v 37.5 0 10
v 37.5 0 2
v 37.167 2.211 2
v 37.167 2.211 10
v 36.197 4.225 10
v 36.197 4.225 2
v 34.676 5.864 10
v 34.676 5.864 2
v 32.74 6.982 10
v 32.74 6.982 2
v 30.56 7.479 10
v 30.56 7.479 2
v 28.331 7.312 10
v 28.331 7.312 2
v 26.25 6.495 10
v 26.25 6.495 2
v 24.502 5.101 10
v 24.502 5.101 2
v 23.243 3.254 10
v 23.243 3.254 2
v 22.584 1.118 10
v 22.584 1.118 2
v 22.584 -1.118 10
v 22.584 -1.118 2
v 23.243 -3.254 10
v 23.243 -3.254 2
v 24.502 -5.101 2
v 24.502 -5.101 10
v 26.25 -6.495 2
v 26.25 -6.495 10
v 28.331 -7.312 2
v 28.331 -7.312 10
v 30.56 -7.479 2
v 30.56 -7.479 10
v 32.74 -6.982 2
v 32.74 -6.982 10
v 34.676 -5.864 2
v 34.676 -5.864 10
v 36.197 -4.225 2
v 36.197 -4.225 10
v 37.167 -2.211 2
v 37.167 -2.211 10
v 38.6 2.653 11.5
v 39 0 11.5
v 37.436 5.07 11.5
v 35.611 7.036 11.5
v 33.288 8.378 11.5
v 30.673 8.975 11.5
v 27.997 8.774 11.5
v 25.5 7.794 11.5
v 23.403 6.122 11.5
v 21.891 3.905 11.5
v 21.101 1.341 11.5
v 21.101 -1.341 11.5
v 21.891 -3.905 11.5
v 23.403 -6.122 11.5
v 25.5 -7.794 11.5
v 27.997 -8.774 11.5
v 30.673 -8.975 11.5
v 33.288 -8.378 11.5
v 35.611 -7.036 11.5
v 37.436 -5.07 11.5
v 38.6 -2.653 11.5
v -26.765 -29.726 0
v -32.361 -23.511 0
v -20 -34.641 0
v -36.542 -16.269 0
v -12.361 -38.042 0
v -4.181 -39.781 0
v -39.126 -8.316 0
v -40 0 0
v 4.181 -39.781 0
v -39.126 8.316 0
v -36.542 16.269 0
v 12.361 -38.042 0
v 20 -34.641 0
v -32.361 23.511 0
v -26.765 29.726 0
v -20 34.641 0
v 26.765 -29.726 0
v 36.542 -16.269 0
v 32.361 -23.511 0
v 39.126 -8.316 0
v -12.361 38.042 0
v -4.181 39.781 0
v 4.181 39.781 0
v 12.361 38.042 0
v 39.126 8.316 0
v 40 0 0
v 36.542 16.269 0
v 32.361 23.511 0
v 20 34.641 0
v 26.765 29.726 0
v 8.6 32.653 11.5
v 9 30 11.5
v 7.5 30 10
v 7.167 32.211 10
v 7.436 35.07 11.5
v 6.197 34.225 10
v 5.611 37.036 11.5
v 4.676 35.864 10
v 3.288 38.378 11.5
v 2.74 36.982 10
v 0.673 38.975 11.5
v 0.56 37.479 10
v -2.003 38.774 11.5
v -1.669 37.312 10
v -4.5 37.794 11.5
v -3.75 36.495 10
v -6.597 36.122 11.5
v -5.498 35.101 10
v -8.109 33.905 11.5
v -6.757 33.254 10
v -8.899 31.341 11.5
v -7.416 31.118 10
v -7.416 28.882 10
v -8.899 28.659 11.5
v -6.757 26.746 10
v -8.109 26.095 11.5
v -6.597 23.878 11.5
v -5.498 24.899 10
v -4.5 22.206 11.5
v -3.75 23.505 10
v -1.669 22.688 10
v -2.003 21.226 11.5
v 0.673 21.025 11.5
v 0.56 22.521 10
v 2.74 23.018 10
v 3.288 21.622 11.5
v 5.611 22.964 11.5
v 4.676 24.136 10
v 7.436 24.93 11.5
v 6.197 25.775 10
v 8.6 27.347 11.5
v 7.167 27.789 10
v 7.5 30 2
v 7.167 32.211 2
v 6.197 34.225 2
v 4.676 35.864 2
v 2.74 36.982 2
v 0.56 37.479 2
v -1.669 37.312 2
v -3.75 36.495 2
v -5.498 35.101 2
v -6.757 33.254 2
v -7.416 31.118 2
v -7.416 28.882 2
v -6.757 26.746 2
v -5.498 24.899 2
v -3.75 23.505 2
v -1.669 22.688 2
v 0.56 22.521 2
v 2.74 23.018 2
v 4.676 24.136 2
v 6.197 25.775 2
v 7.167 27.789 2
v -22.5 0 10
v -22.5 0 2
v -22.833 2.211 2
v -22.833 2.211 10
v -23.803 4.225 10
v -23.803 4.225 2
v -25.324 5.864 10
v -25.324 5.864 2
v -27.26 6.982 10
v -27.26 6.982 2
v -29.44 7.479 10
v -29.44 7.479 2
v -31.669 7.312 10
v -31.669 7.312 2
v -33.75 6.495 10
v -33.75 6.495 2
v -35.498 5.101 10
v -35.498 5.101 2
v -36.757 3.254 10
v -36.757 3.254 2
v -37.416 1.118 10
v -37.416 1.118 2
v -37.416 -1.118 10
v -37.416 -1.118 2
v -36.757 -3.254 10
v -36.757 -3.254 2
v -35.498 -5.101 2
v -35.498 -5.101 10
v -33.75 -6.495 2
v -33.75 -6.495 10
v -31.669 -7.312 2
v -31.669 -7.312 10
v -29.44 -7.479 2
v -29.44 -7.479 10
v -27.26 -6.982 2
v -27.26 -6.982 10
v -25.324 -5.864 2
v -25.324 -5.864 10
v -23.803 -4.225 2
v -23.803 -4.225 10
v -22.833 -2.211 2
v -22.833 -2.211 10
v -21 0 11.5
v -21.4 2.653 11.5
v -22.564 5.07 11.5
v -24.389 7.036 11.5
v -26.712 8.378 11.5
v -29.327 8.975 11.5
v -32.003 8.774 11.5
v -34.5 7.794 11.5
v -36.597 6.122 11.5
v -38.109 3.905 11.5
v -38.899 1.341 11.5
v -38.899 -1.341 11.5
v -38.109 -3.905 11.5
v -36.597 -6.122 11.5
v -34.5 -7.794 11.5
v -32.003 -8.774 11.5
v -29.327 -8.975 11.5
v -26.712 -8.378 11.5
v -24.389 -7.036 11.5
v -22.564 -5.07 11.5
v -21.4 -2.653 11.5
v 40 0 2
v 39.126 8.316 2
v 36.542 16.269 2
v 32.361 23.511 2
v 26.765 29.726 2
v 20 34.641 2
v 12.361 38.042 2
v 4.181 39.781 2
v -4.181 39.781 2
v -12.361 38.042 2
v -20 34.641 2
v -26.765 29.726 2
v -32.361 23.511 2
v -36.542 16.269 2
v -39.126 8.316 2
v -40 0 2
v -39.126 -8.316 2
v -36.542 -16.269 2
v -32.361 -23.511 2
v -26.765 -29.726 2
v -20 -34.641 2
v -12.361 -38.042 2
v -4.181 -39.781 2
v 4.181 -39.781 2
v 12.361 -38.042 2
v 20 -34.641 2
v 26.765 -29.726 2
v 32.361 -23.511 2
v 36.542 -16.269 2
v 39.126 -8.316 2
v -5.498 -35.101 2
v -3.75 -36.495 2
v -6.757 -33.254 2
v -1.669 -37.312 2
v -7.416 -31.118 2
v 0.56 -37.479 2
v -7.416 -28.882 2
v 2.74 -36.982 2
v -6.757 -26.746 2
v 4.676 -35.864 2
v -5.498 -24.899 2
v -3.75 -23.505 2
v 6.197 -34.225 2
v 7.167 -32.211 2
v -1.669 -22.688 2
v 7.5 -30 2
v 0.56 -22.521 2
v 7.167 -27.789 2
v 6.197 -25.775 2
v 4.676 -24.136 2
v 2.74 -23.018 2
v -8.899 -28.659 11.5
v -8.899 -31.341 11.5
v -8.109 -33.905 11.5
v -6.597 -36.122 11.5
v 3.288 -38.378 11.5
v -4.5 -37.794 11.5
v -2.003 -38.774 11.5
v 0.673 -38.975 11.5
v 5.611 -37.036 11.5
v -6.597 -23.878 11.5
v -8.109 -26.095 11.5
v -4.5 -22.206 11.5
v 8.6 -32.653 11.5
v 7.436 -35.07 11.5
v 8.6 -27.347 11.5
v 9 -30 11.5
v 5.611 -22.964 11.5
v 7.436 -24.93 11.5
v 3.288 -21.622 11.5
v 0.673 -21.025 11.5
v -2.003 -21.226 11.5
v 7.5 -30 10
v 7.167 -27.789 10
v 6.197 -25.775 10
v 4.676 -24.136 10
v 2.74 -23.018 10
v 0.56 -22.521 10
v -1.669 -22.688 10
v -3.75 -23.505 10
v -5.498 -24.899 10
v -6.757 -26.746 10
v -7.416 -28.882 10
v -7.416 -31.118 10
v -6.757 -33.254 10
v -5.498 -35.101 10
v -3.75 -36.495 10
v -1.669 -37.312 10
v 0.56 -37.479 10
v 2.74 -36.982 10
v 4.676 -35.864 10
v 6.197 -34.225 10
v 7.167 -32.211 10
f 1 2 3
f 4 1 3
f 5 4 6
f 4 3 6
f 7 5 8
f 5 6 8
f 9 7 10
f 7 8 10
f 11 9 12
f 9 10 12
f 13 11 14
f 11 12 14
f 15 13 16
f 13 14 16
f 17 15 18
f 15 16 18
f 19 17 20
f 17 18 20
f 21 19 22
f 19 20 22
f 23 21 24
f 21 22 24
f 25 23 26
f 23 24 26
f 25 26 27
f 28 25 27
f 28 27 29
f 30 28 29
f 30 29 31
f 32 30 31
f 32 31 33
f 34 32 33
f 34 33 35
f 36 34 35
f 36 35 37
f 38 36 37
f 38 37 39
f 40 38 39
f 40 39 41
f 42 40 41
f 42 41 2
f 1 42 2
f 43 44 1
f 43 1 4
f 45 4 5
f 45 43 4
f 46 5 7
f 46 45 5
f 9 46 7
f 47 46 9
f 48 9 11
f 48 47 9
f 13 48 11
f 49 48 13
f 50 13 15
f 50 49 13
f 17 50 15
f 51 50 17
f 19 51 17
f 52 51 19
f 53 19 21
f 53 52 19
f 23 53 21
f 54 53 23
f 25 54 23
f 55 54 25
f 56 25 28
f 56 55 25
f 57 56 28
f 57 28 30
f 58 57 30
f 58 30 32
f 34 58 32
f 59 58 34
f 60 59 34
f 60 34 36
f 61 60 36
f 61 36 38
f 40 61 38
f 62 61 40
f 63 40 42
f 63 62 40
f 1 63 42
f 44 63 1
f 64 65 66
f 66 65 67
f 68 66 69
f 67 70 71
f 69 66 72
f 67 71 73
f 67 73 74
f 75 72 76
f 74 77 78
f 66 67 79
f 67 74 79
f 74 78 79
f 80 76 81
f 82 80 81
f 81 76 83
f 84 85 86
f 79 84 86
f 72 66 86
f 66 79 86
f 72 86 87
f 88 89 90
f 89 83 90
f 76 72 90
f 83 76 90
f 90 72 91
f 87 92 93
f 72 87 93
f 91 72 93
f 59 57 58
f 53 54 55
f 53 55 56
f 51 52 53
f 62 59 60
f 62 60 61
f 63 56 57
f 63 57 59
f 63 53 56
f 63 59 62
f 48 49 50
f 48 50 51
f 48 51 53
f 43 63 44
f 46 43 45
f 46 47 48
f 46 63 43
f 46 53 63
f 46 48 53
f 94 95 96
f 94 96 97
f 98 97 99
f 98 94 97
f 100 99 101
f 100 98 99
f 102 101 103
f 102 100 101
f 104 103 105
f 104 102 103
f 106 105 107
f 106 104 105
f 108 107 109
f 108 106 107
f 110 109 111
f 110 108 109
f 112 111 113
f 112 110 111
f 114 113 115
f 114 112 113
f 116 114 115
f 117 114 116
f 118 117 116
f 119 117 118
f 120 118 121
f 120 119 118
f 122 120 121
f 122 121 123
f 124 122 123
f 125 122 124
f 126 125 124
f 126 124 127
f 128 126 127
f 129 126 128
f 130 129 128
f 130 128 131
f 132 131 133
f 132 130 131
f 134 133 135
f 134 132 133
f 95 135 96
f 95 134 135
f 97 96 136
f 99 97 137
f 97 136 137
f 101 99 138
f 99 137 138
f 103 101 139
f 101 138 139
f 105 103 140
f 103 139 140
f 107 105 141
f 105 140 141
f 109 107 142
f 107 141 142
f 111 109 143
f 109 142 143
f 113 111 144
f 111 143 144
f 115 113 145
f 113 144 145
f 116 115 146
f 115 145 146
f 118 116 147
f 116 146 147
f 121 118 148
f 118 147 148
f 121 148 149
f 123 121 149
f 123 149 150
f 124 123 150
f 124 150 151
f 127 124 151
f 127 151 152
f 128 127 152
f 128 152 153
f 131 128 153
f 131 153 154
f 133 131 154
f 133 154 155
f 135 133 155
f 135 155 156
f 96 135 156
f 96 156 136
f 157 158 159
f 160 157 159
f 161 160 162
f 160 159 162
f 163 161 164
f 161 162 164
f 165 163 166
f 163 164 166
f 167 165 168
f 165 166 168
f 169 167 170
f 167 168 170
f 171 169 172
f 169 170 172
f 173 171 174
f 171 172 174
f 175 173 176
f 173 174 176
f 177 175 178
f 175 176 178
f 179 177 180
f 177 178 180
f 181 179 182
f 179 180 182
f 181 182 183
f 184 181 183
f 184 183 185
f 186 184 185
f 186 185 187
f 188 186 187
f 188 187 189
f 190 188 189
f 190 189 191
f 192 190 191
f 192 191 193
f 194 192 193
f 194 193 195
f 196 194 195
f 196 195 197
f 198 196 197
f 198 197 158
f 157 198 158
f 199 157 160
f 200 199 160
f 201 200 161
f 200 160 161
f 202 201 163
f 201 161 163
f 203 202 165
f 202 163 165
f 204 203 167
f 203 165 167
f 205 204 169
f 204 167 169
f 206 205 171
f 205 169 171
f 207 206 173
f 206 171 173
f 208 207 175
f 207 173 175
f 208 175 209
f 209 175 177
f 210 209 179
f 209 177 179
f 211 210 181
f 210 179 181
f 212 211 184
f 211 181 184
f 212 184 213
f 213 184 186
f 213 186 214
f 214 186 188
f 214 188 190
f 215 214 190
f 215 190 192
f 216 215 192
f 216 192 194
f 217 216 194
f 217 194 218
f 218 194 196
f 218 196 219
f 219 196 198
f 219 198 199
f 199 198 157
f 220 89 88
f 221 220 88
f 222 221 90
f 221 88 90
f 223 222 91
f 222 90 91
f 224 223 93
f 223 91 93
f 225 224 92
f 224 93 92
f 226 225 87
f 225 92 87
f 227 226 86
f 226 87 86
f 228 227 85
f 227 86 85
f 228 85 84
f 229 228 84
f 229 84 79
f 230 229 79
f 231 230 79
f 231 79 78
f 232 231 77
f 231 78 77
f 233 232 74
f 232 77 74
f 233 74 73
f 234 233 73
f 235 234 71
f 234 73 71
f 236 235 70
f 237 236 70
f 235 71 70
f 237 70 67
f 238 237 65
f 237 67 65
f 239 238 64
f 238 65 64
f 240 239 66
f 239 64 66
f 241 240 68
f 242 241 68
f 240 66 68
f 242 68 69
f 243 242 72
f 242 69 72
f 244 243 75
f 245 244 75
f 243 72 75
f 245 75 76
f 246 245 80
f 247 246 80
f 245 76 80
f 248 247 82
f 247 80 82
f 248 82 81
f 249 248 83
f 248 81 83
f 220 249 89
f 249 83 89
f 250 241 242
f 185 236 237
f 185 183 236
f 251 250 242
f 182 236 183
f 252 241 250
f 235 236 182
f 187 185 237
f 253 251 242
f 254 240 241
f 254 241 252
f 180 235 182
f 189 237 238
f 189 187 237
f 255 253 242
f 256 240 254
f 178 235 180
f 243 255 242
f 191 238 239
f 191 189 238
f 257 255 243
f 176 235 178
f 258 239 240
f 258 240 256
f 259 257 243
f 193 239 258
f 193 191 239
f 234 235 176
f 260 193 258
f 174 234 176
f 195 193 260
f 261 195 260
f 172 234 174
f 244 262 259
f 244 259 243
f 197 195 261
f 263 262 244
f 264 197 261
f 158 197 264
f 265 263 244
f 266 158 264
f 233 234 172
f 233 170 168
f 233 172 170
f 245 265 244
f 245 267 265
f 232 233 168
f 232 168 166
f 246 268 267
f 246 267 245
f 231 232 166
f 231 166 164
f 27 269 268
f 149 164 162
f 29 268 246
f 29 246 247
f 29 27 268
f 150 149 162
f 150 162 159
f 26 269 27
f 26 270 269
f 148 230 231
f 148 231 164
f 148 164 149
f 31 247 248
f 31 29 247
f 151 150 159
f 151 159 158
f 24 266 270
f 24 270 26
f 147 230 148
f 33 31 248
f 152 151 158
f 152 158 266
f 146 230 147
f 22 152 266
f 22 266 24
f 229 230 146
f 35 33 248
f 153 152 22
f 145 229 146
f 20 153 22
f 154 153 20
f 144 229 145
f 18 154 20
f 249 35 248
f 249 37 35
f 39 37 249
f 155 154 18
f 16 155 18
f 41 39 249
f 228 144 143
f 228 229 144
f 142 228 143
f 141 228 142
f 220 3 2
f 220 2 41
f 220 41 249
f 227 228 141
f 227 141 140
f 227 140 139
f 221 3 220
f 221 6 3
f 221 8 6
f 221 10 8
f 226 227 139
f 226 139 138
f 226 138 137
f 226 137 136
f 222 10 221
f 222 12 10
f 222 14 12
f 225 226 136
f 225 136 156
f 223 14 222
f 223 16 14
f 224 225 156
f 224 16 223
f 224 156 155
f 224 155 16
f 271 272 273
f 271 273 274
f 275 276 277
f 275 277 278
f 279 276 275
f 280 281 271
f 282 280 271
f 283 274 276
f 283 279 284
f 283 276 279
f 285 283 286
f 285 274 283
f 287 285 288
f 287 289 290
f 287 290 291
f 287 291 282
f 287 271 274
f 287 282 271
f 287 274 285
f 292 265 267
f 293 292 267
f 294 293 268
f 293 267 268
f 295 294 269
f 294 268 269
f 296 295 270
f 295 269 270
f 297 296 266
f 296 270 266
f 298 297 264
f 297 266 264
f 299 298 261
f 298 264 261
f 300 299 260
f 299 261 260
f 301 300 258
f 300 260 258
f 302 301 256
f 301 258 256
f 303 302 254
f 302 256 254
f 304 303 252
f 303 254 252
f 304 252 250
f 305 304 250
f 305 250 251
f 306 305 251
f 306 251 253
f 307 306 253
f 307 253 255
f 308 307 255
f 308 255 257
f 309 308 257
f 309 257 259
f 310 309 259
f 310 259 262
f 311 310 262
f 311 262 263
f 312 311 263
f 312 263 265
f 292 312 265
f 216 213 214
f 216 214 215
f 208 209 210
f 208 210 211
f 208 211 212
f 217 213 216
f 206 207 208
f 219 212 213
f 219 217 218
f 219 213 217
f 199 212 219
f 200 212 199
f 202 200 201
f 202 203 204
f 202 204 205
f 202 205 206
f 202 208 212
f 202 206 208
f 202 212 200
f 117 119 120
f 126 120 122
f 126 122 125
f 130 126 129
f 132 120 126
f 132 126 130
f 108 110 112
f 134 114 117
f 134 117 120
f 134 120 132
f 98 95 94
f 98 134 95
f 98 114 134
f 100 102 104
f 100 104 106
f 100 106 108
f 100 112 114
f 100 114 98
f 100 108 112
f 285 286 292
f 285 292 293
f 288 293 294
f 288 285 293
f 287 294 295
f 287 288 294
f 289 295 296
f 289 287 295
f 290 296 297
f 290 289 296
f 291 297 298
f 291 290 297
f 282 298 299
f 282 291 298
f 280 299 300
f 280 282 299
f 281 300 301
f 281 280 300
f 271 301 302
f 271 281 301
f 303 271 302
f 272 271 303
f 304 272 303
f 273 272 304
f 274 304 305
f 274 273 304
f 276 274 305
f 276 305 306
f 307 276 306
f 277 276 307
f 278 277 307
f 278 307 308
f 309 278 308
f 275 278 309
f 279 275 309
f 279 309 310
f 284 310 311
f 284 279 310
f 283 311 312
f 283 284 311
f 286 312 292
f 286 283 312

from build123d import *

# Parameters (mm, degrees)
F0_R     = 40
F0_R_2   = 7.5
F1_DEPTH = 2
F2_DEPTH = 10
F3_R     = 9
F3_R_2   = 7.5
F4_DEPTH = 1.5
F5_SIZE  = 1.49999


# Not quite as in the source:
# - a fillet or chamfer is up to 0.001 mm smaller than in the source, because OpenCascade refuses the exact size


with BuildPart() as f1:
    # F0 (on Top) → F1 (new body)
    with BuildSketch(Plane.XY):
        Circle(F0_R)
        with Locations((0, -30)):
            Circle(F0_R_2, mode=Mode.SUBTRACT)
        with Locations((-30, 0)):
            Circle(F0_R_2, mode=Mode.SUBTRACT)
        with Locations((30, 0)):
            Circle(F0_R_2, mode=Mode.SUBTRACT)
        with BuildLine():
            ThreePointArc((0, 22.5), (-5.3033008589, 35.3033008589), (7.5, 30))
            ThreePointArc((7.5, 30), (5.3033008589, 24.6966991411), (0, 22.5))
        make_face(mode=Mode.SUBTRACT)
    extrude(amount=F1_DEPTH)

    # F0 (on Top) → F2 (join)
    with BuildSketch(Plane.XY):
        with Locations((0, -30)):
            Circle(F0_R_2)
        with Locations((30, 0)):
            Circle(F0_R_2)
        with BuildLine():
            ThreePointArc((0, 22.5), (5.3033008589, 24.6966991411), (7.5, 30))
            ThreePointArc((7.5, 30), (-5.3033008589, 35.3033008589), (0, 22.5))
        make_face()
        with Locations((-30, 0)):
            Circle(F0_R_2)
    extrude(amount=F2_DEPTH)

    # F3 (on face) → F4 (join)
    with BuildSketch(Plane.XY.offset(10)):
        with Locations((-30, 0)):
            Circle(F3_R)
        with Locations((0, -30)):
            Circle(F3_R)
        with Locations((0, -30)):
            Circle(F3_R_2, mode=Mode.SUBTRACT)
        with Locations((0, -30)):
            Circle(F3_R_2)
        with Locations((30, 0)):
            Circle(F3_R)
        with Locations((0, 30)):
            Circle(F3_R)
    extrude(amount=F4_DEPTH)

    # F5 (size 1.5 in the source; OpenCascade refuses exactly that, so slightly less here)
    f5_edges = [f1.edges().sort_by_distance(p)[0] for p in [
        (-9, 30, 10),
        (-39, 0, 10),
        (-9, -30, 10),
        (21, 0, 10),
    ]]
    chamfer(f5_edges, length=F5_SIZE)


solid = f1.part
